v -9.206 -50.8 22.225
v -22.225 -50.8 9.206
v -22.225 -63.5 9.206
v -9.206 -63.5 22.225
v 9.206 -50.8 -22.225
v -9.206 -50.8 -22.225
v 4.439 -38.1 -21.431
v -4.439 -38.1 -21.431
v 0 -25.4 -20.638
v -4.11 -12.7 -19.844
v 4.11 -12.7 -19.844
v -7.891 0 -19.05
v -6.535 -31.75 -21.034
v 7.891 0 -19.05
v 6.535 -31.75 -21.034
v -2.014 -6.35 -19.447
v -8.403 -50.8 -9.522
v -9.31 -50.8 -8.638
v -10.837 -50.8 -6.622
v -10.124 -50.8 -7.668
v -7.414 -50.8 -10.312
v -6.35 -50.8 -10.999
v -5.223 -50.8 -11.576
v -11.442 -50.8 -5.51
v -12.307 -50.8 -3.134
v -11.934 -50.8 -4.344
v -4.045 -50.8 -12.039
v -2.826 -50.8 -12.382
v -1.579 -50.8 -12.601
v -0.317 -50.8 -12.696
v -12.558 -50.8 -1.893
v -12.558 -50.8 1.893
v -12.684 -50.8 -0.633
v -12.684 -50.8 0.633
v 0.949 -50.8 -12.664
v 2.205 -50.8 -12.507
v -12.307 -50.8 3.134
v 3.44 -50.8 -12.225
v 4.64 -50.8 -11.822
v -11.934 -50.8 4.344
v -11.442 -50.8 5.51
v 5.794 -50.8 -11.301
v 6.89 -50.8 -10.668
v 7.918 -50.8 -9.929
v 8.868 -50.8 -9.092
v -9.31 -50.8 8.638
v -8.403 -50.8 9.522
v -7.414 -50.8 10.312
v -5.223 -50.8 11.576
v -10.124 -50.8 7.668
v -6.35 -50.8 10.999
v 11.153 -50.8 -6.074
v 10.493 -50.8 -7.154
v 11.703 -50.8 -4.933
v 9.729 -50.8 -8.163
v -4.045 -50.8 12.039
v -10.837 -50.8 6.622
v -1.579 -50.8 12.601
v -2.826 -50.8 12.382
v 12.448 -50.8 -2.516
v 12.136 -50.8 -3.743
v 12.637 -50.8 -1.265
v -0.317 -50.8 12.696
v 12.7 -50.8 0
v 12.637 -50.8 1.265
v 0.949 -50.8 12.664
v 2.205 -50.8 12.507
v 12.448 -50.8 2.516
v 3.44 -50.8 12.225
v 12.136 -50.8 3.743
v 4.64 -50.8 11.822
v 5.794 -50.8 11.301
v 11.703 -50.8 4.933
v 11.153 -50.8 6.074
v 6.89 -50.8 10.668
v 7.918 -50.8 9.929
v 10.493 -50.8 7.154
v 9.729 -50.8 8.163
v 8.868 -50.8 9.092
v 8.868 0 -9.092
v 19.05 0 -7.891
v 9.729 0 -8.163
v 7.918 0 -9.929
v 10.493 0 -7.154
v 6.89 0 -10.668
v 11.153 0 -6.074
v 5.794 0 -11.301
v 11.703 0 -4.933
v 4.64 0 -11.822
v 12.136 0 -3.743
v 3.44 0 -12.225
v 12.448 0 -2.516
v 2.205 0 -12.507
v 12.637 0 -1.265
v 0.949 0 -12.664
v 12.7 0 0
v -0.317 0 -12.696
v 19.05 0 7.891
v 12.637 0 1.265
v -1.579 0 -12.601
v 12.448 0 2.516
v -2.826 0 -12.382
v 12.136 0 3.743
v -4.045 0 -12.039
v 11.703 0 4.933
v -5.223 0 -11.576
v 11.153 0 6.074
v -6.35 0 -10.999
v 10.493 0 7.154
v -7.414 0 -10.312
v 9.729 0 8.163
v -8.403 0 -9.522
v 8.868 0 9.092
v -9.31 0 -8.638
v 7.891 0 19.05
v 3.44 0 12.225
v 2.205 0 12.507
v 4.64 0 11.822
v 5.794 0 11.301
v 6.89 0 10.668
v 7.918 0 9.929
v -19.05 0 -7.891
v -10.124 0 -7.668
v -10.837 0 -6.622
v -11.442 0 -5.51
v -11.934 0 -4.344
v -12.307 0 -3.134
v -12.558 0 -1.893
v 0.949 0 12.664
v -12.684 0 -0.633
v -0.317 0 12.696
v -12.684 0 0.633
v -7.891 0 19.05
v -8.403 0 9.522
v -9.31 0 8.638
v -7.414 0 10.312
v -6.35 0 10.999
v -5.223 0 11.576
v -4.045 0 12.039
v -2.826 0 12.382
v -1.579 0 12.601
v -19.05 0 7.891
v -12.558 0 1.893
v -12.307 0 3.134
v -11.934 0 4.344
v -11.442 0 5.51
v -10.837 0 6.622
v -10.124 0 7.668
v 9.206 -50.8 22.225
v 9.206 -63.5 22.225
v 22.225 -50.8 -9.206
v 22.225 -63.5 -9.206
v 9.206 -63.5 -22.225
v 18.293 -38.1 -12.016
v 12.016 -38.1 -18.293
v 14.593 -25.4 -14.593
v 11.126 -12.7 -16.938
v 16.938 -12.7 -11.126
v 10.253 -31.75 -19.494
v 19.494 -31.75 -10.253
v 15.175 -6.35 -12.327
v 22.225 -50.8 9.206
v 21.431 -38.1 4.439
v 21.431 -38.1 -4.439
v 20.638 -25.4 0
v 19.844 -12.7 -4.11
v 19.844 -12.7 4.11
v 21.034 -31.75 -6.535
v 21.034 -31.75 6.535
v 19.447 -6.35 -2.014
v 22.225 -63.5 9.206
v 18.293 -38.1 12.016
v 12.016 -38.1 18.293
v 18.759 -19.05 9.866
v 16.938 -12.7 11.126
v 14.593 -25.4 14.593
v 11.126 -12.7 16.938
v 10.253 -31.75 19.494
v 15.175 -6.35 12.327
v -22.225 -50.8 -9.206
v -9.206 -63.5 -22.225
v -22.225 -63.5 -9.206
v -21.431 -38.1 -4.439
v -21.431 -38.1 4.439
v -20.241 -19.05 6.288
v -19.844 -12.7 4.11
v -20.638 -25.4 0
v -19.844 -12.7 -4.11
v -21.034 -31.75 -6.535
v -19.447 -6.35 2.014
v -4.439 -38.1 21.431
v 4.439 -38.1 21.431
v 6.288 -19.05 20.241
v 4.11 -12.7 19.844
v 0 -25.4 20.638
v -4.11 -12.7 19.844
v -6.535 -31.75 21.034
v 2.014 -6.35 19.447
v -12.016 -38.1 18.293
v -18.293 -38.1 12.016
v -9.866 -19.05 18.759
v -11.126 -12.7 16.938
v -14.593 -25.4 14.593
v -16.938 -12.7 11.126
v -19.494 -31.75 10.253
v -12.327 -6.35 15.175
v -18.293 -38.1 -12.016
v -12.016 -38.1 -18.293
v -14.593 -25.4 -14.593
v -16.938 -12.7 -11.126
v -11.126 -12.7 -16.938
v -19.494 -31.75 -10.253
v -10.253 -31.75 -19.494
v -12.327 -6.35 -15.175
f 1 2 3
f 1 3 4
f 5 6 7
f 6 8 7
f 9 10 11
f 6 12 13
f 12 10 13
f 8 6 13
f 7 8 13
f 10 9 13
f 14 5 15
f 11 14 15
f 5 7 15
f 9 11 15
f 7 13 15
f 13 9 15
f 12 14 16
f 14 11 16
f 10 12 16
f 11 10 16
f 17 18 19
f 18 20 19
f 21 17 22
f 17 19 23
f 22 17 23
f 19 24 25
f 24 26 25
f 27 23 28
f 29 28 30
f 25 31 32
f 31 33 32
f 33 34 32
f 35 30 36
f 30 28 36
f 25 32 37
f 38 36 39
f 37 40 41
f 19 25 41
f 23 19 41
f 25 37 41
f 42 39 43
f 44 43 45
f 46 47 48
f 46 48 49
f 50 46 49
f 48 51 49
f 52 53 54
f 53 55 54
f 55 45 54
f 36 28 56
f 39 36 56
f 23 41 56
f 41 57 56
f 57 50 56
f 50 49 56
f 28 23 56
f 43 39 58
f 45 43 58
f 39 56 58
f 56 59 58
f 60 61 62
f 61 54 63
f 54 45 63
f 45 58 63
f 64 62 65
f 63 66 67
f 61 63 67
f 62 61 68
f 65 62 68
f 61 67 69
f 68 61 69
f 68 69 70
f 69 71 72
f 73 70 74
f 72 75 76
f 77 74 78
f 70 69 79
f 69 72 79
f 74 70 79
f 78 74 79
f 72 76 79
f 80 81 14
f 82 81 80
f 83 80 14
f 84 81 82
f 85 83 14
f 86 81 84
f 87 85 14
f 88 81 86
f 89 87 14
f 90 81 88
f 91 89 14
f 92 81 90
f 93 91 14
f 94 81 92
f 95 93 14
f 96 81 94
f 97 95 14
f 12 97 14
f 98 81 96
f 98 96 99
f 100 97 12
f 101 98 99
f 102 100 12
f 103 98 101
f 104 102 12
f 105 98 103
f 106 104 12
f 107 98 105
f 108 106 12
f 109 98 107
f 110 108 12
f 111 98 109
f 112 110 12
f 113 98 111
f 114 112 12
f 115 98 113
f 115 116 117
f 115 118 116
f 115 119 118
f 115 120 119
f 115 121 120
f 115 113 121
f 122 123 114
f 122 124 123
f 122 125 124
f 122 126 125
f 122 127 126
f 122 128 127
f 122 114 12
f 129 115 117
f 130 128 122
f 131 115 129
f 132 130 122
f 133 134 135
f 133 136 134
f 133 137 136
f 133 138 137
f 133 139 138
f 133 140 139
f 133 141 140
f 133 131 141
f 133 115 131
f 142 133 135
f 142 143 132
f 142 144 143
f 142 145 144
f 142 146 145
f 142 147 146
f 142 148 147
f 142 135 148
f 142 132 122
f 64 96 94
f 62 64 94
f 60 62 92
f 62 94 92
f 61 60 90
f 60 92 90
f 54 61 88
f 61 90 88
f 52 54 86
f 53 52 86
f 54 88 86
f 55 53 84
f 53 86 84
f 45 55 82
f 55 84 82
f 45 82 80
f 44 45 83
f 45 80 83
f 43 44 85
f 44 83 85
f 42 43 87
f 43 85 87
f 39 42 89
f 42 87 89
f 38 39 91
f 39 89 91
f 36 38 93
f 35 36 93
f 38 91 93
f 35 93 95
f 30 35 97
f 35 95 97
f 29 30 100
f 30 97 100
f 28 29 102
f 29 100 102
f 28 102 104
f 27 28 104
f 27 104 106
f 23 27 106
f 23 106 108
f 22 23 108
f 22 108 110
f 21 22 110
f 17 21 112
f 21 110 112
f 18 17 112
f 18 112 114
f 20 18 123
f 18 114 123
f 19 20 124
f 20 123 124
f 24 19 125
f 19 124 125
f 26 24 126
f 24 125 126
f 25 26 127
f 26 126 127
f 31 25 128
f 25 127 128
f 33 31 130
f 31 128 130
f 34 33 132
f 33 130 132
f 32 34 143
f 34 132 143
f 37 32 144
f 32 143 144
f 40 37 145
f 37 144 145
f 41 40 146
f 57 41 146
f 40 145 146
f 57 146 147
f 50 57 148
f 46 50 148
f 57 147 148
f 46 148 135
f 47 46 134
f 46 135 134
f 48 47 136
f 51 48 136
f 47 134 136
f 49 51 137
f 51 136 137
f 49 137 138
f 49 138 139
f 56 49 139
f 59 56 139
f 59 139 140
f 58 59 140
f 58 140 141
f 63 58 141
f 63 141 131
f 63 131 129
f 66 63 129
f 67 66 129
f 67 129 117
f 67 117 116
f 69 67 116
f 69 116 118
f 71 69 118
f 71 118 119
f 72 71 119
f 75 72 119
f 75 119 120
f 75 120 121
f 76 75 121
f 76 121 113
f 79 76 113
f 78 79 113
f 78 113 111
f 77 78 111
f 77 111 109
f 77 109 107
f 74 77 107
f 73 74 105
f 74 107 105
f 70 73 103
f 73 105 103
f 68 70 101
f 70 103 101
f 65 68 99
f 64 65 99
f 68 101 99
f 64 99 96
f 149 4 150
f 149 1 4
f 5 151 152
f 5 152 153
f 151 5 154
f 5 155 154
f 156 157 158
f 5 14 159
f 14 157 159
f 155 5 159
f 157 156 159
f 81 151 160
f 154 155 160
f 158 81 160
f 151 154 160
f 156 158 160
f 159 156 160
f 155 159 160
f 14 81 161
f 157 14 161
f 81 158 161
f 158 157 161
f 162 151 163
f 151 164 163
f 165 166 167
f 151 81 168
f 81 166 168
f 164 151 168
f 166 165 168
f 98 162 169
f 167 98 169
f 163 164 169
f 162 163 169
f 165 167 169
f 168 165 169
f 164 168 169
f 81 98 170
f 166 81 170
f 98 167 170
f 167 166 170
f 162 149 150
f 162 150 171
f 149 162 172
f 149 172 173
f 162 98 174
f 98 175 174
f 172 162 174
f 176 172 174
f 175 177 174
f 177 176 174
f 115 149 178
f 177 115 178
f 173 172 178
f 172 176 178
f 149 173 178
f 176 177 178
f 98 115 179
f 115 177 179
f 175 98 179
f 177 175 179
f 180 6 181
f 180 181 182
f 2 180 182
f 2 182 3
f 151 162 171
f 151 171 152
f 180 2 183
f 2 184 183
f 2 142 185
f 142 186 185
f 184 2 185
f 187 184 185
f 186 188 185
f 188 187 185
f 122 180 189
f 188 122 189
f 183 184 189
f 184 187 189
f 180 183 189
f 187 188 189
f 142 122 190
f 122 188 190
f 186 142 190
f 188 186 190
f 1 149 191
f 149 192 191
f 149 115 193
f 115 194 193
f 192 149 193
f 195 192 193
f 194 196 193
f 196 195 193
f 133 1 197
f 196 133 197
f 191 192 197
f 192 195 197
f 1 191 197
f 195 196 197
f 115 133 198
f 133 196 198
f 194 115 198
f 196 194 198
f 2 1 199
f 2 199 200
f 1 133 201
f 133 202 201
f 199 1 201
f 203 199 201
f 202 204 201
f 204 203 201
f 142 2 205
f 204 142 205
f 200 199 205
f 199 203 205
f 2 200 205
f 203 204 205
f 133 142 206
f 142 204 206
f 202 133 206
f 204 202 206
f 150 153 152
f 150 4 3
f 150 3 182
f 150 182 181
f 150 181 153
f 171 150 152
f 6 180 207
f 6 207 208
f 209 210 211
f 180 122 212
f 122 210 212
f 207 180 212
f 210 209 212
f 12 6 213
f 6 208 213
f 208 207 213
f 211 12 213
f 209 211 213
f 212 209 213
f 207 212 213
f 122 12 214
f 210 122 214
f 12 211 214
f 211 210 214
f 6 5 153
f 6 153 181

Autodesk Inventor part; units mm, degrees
ref_plane "YZ Plane" through (0, 0, 0) normal (1, 0, 0) x (0, 1, 0)
ref_plane "XZ Plane" through (0, 0, 0) normal (0, 1, 0) x (-1, 0, 0)
ref_plane "XY Plane" through (0, 0, 0) normal (0, 0, 1) x (1, 0, 0)
sketch "Sketch1" plane through (0, 0, 0) normal (0, 1, 0) x (-1, 0, 0)
  line L0 (7.8908, 19.05) -> (19.05, 7.8908)
  line L1 (19.05, 7.8908) -> (19.05, -7.8908)
  line L2 (19.05, -7.8908) -> (7.8908, -19.05)
  line L3 (7.8908, -19.05) -> (-7.8908, -19.05)
  line L4 (-7.8908, -19.05) -> (-19.05, -7.8908)
  line L5 (-19.05, -7.8908) -> (-19.05, 7.8908)
  line L6 (-19.05, 7.8908) -> (-7.8908, 19.05)
  line L7 (-7.8908, 19.05) -> (7.8908, 19.05)
  point P0 (0, 0)
  point P1 (0, 0)
  dimension "d5" = 19.05
extrude "Extrusion1" add sketch "Sketch1" against normal blind 50.8
sketch "Sketch4" plane through (0, -50.8, 0) normal (0, -1, 0) x (1, 0, 0)
  line L0 (9.2059, 22.225) -> (22.225, 9.2059)
  line L1 (22.225, 9.2059) -> (22.225, -9.2059)
  line L2 (22.225, -9.2059) -> (9.2059, -22.225)
  line L3 (9.2059, -22.225) -> (-9.2059, -22.225)
  line L4 (-9.2059, -22.225) -> (-22.225, -9.2059)
  line L5 (-22.225, -9.2059) -> (-22.225, 9.2059)
  line L6 (-22.225, 9.2059) -> (-9.2059, 22.225)
  line L7 (-9.2059, 22.225) -> (9.2059, 22.225)
  line L8 (7.8908, 19.05) -> (-7.8908, 19.05) projected
  point P0 (0, 0)
  point P1 (0, 0)
  dimension "d17" = 3.175
loft "Loft1" add profiles "Sketch4" section 2 edges at (-13.4704, 0, 13.4704) (0, 0, 19.05) (13.4704, 0, 13.4704) (19.05, 0, 0) (13.4704, 0, -13.4704) (0, 0, -19.05) (-13.4704, 0, -13.4704) (-19.05, 0, 0)
sketch "Sketch5" plane through (0, 0, 0) normal (0, 1, 0) x (1, 0, 0)
  circle A0 centre (0, 0) radius 12.7
  dimension "d11" = 25.4
extrude "Extrusion2" cut sketch "Sketch5" against normal blind 50.8
ref_plane "Work Plane1" through (0, -50.8, 22.225) normal (1, 0, 0) x (0, 1, 0)
sketch "Sketch6" plane through (0, -50.8, 22.225) normal (1, 0, 0) x (0, 1, 0)
  point P0 (50.8, -22.225)
sketch "Sketch7" plane through (0, -50.8, 22.225) normal (1, 0, 0) x (0, 1, 0)
  point P0 (50.8, -22.225)
sketch "Sketch8" plane through (0, -50.8, 0) normal (0, -1, 0) x (1, 0, 0)
  circle A0 centre (0, 0) radius 12.7 projected
  line L0 (9.2059, 22.225) -> (22.225, 9.2059) projected
  line L1 (-9.2059, 22.225) -> (9.2059, 22.225) projected
  line L2 (-22.225, 9.2059) -> (-9.2059, 22.225) projected
  line L3 (-22.225, -9.2059) -> (-22.225, 9.2059) projected
  line L4 (-9.2059, -22.225) -> (-22.225, -9.2059) projected
  line L5 (9.2059, -22.225) -> (-9.2059, -22.225) projected
  line L6 (22.225, -9.2059) -> (9.2059, -22.225) projected
  line L7 (22.225, 9.2059) -> (22.225, -9.2059) projected
extrude "Extrusion3" add sketch "Sketch8" along normal blind 12.7 contours A0 | L0 L7 L6 L5 L4 L3 L2 L1
sketch "Sketch9" plane through (0, -50.8, 22.225) normal (1, 0, 0) x (0, 1, 0)
  line L0 (-12.7, -31.4309) -> (-12.7, -44.45) construction
  line L1 (-12.7, -13.0191) -> (-12.7, -31.4309) construction
  line L2 (-12.7, 0) -> (-12.7, -13.0191) construction
  line L3 (0, -44.45) -> (-12.7, -44.45) construction
  line L4 (0, -44.45) -> (50.8, -41.275) construction
  line L5 (0, 0) -> (-12.7, 0) construction
  line L6 (0, 0) -> (50.8, -3.175) construction
  line L7 (0, -13.0191) -> (0, 0) construction
  line L8 (0, -34.925) -> (0, -9.525) construction
  line L9 (0, -44.45) -> (0, -31.4309) construction
  line L10 (50.8, -30.1158) -> (50.8, -41.275) construction
  line L11 (50.8, -9.525) -> (50.8, -34.925) construction
  line L12 (50.8, -3.175) -> (50.8, -14.3342) construction
  line L13 (-6.35, 0) -> (-6.35, -44.45) construction
  line L14 (-12.7, -22.225) -> (0, -22.225) construction
  arc A0 (-37.0757, -22.225) -> (-31.6983, -79.4354) centre (269.9482, -22.225) ccw
  line L15 (-37.0757, -22.225) -> (-6.35, -22.225)
  arc A1 (-6.35, -44.45) -> (-24.1759, -60.6977) centre (-5.386, -63.4102) ccw
  point P0 (50.8, -22.225)
properties part number "V1.0"
